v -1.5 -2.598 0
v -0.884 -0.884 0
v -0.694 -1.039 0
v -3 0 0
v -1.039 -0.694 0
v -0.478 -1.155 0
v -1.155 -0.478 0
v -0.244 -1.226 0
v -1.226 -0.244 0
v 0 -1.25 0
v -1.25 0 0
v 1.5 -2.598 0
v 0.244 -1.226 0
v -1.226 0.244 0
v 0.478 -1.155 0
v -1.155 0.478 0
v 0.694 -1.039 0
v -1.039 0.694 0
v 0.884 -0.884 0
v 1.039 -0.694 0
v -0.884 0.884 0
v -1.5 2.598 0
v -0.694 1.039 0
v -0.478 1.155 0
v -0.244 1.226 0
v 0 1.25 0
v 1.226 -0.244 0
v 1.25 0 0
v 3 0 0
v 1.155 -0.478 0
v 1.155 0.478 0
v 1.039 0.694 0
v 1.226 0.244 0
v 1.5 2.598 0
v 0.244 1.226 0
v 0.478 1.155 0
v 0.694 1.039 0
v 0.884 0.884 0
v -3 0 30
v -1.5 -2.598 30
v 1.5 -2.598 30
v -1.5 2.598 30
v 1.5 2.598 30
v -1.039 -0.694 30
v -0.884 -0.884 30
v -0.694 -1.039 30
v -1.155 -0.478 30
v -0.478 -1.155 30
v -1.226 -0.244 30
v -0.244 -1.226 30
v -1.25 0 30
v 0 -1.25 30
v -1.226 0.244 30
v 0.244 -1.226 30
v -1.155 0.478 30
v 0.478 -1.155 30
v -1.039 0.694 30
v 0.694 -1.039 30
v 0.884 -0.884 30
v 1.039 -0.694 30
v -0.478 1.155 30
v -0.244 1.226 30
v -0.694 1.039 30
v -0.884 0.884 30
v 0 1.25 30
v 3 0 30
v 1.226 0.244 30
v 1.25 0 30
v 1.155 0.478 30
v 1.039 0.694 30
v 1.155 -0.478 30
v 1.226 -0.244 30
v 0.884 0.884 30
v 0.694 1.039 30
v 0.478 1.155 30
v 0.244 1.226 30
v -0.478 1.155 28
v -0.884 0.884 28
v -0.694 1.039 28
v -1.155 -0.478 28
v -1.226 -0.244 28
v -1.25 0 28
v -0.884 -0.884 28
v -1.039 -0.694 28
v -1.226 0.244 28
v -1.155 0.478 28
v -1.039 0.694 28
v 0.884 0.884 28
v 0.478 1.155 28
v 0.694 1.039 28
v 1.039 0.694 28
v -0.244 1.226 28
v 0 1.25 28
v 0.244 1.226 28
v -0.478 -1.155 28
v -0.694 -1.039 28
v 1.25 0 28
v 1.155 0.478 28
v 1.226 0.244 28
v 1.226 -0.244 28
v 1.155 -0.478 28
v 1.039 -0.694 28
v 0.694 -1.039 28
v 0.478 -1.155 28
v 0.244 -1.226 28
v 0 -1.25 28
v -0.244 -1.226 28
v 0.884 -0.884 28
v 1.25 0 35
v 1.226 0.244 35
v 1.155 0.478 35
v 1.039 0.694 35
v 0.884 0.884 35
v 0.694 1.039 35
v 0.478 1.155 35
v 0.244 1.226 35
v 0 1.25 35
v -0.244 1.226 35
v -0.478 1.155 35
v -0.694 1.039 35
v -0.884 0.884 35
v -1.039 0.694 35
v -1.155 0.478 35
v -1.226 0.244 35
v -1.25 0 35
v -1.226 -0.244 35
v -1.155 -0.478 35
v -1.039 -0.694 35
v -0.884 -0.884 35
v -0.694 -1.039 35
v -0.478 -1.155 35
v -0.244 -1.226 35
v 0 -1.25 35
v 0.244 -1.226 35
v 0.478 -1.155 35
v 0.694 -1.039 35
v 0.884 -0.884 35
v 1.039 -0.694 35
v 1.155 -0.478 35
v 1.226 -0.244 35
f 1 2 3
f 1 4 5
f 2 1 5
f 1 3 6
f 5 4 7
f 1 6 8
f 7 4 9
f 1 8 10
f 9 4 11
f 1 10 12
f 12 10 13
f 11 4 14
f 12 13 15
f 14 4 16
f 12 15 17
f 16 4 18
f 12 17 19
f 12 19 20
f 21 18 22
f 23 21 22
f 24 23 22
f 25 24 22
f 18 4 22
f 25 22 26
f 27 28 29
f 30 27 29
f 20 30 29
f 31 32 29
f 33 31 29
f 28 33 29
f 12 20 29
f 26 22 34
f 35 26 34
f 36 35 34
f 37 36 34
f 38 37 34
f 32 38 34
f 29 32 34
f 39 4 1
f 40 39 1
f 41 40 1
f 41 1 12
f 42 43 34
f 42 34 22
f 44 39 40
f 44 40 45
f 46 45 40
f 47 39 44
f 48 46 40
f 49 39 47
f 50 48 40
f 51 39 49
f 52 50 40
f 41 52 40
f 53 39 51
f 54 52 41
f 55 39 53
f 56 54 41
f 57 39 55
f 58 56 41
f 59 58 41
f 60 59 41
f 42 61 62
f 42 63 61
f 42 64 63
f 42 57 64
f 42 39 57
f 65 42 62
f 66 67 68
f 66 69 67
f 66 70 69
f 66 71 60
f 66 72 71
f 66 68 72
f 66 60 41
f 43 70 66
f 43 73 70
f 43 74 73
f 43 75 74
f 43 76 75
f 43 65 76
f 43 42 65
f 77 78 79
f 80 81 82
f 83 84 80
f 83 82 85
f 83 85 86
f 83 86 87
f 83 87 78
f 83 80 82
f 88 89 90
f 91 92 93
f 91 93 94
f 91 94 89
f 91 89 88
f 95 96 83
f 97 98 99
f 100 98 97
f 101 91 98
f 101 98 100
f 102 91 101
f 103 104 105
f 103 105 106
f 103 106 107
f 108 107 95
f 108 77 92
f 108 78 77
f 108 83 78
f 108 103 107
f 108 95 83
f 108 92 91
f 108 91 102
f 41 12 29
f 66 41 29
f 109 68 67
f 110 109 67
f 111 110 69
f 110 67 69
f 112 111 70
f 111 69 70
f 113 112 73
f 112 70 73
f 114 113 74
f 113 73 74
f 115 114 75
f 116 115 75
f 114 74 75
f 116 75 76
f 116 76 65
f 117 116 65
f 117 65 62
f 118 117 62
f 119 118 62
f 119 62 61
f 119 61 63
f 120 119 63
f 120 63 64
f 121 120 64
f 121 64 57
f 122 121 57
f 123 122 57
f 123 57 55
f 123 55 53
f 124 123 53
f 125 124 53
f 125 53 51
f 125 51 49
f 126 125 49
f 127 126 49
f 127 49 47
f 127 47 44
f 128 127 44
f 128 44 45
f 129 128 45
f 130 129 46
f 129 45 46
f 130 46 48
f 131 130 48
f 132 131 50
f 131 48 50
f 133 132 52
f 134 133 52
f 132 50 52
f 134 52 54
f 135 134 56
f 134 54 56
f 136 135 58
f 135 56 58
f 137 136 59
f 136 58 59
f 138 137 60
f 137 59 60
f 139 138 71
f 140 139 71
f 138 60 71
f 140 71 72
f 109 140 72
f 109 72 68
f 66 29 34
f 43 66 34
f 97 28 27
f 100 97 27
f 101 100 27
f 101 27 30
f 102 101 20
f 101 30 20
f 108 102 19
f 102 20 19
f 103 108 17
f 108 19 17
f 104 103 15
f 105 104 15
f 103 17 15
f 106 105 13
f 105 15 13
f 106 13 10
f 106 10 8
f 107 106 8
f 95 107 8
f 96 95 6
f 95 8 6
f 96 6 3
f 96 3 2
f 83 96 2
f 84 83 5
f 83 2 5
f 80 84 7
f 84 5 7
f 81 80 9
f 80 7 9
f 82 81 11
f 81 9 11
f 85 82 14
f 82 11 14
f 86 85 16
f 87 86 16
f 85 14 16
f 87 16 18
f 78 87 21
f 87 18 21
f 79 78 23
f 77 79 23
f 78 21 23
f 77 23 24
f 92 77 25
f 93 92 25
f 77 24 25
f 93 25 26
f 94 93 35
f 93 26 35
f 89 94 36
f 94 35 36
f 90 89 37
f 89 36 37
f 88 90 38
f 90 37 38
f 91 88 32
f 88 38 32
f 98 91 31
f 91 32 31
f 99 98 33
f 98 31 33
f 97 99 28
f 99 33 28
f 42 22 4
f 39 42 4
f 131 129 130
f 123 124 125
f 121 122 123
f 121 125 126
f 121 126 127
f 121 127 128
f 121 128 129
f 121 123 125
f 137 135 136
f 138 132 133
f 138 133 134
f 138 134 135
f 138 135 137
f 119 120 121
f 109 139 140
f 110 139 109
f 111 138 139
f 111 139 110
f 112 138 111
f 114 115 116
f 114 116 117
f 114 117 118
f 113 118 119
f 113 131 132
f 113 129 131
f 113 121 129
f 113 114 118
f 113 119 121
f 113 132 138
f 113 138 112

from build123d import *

# Parameters (mm, degrees)
F0_R     = 1.25
F1_DEPTH = 30
F2_DEPTH = 35
F3_R     = 1.25
F4_DEPTH = 28


# Not quite as in the source:
# - a feature names something its author has since deleted; it is built from what else it names


with BuildPart() as f1:
    # F0 (on Top) → F1 (new body)
    with BuildSketch(Plane.XY):
        Polygon((1.5, 2.5980762114), (-1.5, 2.5980762114), (-3, 0), (-1.5, -2.5980762114), (1.5, -2.5980762114), (3, 0), align=None)
        Circle(F0_R, mode=Mode.SUBTRACT)
    extrude(amount=F1_DEPTH)

    # F0 (on Top) → F2 (join)
    with BuildSketch(Plane.XY):
        Circle(F0_R)
    extrude(amount=F2_DEPTH)

    # F3 (on face) → F4 (cut)
    with BuildSketch(Plane(origin=(0, 0, 0), x_dir=(1, 0, 0), z_dir=(0, 0, -1))):
        Circle(F3_R)
    extrude(amount=-F4_DEPTH, mode=Mode.SUBTRACT)


solid = f1.part
